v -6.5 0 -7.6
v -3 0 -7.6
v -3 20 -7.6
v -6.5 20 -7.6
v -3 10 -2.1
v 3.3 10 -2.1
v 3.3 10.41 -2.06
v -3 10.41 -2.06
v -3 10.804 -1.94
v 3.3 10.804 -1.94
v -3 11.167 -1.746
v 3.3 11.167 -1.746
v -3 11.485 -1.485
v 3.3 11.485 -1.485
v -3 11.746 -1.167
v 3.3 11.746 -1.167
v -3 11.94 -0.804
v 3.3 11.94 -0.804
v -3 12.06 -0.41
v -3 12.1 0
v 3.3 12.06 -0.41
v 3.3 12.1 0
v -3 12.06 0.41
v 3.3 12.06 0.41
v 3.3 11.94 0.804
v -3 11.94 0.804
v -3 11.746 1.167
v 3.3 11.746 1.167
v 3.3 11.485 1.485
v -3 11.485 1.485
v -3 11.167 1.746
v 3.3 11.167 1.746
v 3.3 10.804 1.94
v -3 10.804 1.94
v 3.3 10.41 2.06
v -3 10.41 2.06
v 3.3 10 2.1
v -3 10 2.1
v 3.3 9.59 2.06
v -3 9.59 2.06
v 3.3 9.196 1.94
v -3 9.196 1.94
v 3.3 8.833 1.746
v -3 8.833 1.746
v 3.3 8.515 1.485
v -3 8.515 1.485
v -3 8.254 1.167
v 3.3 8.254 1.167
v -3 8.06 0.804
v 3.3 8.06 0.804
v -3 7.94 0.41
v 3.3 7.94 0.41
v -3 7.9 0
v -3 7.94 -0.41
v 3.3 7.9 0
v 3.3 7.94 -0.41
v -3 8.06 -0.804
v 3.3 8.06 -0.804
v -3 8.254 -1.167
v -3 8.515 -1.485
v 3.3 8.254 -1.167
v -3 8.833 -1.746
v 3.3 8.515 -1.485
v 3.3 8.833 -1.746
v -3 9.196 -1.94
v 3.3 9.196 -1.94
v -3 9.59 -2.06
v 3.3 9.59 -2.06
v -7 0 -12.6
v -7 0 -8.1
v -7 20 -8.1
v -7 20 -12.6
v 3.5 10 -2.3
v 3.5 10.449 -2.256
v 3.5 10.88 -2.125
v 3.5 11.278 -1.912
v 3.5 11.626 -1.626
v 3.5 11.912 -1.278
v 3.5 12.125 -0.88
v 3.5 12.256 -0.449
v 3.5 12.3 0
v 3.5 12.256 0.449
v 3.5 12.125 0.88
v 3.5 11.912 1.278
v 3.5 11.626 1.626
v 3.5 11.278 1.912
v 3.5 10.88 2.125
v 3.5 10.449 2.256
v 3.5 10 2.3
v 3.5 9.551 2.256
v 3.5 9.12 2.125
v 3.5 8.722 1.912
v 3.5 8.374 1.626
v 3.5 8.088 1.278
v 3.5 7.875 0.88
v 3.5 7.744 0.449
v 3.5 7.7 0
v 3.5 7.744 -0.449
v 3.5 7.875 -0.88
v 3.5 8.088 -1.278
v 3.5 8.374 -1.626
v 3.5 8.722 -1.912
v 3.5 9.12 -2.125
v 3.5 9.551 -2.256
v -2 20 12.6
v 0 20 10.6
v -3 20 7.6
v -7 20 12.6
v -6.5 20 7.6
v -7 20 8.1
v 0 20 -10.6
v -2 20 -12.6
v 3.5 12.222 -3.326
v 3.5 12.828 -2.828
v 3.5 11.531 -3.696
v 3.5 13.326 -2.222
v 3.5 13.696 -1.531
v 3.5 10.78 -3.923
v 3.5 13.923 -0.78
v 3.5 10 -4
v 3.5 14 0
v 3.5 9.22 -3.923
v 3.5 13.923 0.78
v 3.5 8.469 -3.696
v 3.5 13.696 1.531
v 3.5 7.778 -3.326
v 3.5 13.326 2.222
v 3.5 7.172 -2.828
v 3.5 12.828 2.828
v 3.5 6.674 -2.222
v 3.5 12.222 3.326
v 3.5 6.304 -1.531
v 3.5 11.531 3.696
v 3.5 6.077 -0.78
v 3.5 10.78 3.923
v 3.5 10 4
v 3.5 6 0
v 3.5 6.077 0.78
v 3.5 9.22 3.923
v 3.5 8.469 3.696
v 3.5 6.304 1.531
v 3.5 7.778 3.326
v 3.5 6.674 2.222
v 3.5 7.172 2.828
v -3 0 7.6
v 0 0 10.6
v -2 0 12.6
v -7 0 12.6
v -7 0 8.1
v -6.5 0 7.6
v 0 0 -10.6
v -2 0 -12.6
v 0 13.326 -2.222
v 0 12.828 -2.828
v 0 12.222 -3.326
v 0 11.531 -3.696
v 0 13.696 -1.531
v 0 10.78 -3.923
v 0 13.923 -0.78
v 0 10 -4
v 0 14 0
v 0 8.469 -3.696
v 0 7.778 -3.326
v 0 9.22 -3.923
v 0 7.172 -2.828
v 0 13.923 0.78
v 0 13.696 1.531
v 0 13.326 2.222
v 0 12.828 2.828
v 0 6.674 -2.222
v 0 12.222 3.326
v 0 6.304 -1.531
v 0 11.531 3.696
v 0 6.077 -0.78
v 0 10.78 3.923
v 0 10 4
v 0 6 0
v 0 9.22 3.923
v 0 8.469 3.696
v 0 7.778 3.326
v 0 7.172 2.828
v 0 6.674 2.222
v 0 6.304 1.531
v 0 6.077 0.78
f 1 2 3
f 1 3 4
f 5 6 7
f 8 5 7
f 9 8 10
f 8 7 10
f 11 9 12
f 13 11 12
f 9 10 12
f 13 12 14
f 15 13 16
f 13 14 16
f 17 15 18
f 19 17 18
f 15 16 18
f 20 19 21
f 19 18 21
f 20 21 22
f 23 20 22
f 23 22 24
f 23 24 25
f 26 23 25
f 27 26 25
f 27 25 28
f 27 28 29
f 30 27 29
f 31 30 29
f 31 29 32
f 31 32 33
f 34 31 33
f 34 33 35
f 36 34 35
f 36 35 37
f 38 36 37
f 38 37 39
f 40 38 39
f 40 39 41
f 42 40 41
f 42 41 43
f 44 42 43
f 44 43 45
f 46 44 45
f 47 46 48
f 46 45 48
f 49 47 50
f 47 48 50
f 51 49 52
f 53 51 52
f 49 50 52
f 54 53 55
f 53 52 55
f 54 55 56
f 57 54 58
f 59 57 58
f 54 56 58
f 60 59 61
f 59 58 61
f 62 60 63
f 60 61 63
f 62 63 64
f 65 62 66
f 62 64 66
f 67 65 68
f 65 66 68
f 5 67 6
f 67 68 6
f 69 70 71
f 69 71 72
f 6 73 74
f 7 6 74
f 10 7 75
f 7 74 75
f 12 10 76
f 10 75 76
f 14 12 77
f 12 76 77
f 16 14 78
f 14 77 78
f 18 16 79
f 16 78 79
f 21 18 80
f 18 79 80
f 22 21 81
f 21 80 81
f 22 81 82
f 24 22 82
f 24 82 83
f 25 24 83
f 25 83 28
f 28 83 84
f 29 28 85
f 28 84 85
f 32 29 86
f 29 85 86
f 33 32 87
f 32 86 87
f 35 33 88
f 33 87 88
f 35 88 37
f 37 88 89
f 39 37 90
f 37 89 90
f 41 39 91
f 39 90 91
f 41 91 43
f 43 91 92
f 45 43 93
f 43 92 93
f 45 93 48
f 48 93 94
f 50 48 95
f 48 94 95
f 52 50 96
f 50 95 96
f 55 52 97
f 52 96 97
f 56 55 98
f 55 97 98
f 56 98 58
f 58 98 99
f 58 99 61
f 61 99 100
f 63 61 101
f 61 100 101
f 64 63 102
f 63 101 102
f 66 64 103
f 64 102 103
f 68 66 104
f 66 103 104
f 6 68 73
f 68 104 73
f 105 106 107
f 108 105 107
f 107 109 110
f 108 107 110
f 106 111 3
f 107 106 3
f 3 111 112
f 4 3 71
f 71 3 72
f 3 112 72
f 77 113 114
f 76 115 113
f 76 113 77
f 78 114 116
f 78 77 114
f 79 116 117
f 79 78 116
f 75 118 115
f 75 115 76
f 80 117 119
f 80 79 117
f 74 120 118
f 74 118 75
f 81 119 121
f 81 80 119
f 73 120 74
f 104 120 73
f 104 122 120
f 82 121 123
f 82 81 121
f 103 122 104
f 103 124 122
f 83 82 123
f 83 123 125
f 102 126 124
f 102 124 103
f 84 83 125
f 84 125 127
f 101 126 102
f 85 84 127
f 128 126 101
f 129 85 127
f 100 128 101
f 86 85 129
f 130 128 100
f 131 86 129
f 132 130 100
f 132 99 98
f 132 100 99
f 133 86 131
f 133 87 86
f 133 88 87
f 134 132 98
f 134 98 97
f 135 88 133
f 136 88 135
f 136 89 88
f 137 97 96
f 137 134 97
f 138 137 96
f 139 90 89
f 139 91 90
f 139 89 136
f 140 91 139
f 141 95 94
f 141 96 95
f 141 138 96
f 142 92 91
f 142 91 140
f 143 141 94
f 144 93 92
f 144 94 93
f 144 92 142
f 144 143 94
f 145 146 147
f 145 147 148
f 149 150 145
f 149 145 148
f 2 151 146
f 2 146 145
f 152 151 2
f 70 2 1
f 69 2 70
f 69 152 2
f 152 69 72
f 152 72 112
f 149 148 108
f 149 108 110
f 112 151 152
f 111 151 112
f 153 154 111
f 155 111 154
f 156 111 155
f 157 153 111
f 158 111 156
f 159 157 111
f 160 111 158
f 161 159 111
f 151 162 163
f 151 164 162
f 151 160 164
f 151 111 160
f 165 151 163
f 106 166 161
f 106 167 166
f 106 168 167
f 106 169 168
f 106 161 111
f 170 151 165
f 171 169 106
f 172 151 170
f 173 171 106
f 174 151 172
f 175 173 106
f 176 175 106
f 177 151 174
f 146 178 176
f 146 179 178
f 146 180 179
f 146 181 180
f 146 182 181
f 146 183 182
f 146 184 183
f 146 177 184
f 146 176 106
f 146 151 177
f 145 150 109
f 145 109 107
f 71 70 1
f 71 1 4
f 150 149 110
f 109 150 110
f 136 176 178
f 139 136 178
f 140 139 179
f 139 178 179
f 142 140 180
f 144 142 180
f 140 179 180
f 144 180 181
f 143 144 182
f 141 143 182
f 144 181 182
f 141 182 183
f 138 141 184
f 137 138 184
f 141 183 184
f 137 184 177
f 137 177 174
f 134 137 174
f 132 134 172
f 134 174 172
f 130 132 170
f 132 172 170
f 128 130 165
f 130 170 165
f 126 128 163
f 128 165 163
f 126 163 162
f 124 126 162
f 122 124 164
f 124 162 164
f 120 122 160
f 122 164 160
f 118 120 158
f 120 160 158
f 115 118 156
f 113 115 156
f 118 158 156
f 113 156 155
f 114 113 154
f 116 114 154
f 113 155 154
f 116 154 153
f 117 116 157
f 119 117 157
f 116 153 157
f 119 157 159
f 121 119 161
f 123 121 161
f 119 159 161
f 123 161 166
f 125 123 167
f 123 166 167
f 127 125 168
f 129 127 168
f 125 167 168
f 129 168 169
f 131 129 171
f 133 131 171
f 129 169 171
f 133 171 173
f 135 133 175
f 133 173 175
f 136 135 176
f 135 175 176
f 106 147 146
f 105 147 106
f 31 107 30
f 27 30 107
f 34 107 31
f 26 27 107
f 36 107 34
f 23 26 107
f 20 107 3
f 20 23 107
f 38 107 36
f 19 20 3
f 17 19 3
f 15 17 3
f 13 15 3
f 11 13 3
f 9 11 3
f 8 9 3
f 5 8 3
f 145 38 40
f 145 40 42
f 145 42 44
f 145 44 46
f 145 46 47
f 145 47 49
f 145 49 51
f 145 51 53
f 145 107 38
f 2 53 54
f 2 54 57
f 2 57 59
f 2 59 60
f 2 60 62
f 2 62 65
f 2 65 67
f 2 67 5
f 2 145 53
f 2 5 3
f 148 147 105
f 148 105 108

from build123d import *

# Parameters (mm, degrees)
EXTRUDE_1_DEPTH     = 20
CHAMFER_1_SIZE      = 2
SKETCH_2_R          = 4
EXTRUDE_2_DEPTH     = 3.5
SKETCH_3_R          = 2.1
CUT_EXTRUDE_1_DEPTH = 26.865227623
CHAMFER_2_SIZE      = 0.2
CHAMFER_3_SIZE      = 0.5


with BuildPart() as part:
    # 草图1 → 凸台-拉伸1 (new body)
    with BuildSketch(Plane(origin=(0, 0, 0), x_dir=(1, 0, 0), z_dir=(0, 1, 0))):
        Polygon((-7, 12.6), (0, 12.6), (0, -12.6), (-7, -12.6), (-7, -7.6), (-3, -7.6), (-3, 7.6), (-7, 7.6), align=None)
    extrude(amount=EXTRUDE_1_DEPTH)

    # 倒角1
    chamfer_1_edges = [part.edges().sort_by_distance(p)[0] for p in [
        (0, 10, -12.6),
        (0, 10, 12.6),
    ]]
    chamfer(chamfer_1_edges, length=CHAMFER_1_SIZE)

    # 草图2 → 凸台-拉伸2 (add)
    with BuildSketch(Plane(origin=(0, 0, 0), x_dir=(0, 0, -1), z_dir=(1, 0, 0))):
        with Locations(Location((0, 10, 0), (0, 0, 180))):
            Circle(SKETCH_2_R)
    extrude(amount=EXTRUDE_2_DEPTH)

    # 草图3 → 切除-拉伸1 (cut, through all)
    with BuildSketch(Plane(origin=(3.5, 0, 0), x_dir=(0, 0, -1), z_dir=(1, 0, 0))):
        with Locations((0, 10)):
            Circle(SKETCH_3_R)
    extrude(amount=-CUT_EXTRUDE_1_DEPTH, mode=Mode.SUBTRACT)

    # 倒角2
    chamfer_2_edges = [part.edges().sort_by_distance(p)[0] for p in [
        (3.5, 10, 2.1),
    ]]
    chamfer(chamfer_2_edges, length=CHAMFER_2_SIZE)

    # 倒角3
    chamfer_3_edges = [part.edges().sort_by_distance(p)[0] for p in [
        (-7, 10, 7.6),
        (-7, 10, -7.6),
    ]]
    chamfer(chamfer_3_edges, length=CHAMFER_3_SIZE)


solid = part.part
